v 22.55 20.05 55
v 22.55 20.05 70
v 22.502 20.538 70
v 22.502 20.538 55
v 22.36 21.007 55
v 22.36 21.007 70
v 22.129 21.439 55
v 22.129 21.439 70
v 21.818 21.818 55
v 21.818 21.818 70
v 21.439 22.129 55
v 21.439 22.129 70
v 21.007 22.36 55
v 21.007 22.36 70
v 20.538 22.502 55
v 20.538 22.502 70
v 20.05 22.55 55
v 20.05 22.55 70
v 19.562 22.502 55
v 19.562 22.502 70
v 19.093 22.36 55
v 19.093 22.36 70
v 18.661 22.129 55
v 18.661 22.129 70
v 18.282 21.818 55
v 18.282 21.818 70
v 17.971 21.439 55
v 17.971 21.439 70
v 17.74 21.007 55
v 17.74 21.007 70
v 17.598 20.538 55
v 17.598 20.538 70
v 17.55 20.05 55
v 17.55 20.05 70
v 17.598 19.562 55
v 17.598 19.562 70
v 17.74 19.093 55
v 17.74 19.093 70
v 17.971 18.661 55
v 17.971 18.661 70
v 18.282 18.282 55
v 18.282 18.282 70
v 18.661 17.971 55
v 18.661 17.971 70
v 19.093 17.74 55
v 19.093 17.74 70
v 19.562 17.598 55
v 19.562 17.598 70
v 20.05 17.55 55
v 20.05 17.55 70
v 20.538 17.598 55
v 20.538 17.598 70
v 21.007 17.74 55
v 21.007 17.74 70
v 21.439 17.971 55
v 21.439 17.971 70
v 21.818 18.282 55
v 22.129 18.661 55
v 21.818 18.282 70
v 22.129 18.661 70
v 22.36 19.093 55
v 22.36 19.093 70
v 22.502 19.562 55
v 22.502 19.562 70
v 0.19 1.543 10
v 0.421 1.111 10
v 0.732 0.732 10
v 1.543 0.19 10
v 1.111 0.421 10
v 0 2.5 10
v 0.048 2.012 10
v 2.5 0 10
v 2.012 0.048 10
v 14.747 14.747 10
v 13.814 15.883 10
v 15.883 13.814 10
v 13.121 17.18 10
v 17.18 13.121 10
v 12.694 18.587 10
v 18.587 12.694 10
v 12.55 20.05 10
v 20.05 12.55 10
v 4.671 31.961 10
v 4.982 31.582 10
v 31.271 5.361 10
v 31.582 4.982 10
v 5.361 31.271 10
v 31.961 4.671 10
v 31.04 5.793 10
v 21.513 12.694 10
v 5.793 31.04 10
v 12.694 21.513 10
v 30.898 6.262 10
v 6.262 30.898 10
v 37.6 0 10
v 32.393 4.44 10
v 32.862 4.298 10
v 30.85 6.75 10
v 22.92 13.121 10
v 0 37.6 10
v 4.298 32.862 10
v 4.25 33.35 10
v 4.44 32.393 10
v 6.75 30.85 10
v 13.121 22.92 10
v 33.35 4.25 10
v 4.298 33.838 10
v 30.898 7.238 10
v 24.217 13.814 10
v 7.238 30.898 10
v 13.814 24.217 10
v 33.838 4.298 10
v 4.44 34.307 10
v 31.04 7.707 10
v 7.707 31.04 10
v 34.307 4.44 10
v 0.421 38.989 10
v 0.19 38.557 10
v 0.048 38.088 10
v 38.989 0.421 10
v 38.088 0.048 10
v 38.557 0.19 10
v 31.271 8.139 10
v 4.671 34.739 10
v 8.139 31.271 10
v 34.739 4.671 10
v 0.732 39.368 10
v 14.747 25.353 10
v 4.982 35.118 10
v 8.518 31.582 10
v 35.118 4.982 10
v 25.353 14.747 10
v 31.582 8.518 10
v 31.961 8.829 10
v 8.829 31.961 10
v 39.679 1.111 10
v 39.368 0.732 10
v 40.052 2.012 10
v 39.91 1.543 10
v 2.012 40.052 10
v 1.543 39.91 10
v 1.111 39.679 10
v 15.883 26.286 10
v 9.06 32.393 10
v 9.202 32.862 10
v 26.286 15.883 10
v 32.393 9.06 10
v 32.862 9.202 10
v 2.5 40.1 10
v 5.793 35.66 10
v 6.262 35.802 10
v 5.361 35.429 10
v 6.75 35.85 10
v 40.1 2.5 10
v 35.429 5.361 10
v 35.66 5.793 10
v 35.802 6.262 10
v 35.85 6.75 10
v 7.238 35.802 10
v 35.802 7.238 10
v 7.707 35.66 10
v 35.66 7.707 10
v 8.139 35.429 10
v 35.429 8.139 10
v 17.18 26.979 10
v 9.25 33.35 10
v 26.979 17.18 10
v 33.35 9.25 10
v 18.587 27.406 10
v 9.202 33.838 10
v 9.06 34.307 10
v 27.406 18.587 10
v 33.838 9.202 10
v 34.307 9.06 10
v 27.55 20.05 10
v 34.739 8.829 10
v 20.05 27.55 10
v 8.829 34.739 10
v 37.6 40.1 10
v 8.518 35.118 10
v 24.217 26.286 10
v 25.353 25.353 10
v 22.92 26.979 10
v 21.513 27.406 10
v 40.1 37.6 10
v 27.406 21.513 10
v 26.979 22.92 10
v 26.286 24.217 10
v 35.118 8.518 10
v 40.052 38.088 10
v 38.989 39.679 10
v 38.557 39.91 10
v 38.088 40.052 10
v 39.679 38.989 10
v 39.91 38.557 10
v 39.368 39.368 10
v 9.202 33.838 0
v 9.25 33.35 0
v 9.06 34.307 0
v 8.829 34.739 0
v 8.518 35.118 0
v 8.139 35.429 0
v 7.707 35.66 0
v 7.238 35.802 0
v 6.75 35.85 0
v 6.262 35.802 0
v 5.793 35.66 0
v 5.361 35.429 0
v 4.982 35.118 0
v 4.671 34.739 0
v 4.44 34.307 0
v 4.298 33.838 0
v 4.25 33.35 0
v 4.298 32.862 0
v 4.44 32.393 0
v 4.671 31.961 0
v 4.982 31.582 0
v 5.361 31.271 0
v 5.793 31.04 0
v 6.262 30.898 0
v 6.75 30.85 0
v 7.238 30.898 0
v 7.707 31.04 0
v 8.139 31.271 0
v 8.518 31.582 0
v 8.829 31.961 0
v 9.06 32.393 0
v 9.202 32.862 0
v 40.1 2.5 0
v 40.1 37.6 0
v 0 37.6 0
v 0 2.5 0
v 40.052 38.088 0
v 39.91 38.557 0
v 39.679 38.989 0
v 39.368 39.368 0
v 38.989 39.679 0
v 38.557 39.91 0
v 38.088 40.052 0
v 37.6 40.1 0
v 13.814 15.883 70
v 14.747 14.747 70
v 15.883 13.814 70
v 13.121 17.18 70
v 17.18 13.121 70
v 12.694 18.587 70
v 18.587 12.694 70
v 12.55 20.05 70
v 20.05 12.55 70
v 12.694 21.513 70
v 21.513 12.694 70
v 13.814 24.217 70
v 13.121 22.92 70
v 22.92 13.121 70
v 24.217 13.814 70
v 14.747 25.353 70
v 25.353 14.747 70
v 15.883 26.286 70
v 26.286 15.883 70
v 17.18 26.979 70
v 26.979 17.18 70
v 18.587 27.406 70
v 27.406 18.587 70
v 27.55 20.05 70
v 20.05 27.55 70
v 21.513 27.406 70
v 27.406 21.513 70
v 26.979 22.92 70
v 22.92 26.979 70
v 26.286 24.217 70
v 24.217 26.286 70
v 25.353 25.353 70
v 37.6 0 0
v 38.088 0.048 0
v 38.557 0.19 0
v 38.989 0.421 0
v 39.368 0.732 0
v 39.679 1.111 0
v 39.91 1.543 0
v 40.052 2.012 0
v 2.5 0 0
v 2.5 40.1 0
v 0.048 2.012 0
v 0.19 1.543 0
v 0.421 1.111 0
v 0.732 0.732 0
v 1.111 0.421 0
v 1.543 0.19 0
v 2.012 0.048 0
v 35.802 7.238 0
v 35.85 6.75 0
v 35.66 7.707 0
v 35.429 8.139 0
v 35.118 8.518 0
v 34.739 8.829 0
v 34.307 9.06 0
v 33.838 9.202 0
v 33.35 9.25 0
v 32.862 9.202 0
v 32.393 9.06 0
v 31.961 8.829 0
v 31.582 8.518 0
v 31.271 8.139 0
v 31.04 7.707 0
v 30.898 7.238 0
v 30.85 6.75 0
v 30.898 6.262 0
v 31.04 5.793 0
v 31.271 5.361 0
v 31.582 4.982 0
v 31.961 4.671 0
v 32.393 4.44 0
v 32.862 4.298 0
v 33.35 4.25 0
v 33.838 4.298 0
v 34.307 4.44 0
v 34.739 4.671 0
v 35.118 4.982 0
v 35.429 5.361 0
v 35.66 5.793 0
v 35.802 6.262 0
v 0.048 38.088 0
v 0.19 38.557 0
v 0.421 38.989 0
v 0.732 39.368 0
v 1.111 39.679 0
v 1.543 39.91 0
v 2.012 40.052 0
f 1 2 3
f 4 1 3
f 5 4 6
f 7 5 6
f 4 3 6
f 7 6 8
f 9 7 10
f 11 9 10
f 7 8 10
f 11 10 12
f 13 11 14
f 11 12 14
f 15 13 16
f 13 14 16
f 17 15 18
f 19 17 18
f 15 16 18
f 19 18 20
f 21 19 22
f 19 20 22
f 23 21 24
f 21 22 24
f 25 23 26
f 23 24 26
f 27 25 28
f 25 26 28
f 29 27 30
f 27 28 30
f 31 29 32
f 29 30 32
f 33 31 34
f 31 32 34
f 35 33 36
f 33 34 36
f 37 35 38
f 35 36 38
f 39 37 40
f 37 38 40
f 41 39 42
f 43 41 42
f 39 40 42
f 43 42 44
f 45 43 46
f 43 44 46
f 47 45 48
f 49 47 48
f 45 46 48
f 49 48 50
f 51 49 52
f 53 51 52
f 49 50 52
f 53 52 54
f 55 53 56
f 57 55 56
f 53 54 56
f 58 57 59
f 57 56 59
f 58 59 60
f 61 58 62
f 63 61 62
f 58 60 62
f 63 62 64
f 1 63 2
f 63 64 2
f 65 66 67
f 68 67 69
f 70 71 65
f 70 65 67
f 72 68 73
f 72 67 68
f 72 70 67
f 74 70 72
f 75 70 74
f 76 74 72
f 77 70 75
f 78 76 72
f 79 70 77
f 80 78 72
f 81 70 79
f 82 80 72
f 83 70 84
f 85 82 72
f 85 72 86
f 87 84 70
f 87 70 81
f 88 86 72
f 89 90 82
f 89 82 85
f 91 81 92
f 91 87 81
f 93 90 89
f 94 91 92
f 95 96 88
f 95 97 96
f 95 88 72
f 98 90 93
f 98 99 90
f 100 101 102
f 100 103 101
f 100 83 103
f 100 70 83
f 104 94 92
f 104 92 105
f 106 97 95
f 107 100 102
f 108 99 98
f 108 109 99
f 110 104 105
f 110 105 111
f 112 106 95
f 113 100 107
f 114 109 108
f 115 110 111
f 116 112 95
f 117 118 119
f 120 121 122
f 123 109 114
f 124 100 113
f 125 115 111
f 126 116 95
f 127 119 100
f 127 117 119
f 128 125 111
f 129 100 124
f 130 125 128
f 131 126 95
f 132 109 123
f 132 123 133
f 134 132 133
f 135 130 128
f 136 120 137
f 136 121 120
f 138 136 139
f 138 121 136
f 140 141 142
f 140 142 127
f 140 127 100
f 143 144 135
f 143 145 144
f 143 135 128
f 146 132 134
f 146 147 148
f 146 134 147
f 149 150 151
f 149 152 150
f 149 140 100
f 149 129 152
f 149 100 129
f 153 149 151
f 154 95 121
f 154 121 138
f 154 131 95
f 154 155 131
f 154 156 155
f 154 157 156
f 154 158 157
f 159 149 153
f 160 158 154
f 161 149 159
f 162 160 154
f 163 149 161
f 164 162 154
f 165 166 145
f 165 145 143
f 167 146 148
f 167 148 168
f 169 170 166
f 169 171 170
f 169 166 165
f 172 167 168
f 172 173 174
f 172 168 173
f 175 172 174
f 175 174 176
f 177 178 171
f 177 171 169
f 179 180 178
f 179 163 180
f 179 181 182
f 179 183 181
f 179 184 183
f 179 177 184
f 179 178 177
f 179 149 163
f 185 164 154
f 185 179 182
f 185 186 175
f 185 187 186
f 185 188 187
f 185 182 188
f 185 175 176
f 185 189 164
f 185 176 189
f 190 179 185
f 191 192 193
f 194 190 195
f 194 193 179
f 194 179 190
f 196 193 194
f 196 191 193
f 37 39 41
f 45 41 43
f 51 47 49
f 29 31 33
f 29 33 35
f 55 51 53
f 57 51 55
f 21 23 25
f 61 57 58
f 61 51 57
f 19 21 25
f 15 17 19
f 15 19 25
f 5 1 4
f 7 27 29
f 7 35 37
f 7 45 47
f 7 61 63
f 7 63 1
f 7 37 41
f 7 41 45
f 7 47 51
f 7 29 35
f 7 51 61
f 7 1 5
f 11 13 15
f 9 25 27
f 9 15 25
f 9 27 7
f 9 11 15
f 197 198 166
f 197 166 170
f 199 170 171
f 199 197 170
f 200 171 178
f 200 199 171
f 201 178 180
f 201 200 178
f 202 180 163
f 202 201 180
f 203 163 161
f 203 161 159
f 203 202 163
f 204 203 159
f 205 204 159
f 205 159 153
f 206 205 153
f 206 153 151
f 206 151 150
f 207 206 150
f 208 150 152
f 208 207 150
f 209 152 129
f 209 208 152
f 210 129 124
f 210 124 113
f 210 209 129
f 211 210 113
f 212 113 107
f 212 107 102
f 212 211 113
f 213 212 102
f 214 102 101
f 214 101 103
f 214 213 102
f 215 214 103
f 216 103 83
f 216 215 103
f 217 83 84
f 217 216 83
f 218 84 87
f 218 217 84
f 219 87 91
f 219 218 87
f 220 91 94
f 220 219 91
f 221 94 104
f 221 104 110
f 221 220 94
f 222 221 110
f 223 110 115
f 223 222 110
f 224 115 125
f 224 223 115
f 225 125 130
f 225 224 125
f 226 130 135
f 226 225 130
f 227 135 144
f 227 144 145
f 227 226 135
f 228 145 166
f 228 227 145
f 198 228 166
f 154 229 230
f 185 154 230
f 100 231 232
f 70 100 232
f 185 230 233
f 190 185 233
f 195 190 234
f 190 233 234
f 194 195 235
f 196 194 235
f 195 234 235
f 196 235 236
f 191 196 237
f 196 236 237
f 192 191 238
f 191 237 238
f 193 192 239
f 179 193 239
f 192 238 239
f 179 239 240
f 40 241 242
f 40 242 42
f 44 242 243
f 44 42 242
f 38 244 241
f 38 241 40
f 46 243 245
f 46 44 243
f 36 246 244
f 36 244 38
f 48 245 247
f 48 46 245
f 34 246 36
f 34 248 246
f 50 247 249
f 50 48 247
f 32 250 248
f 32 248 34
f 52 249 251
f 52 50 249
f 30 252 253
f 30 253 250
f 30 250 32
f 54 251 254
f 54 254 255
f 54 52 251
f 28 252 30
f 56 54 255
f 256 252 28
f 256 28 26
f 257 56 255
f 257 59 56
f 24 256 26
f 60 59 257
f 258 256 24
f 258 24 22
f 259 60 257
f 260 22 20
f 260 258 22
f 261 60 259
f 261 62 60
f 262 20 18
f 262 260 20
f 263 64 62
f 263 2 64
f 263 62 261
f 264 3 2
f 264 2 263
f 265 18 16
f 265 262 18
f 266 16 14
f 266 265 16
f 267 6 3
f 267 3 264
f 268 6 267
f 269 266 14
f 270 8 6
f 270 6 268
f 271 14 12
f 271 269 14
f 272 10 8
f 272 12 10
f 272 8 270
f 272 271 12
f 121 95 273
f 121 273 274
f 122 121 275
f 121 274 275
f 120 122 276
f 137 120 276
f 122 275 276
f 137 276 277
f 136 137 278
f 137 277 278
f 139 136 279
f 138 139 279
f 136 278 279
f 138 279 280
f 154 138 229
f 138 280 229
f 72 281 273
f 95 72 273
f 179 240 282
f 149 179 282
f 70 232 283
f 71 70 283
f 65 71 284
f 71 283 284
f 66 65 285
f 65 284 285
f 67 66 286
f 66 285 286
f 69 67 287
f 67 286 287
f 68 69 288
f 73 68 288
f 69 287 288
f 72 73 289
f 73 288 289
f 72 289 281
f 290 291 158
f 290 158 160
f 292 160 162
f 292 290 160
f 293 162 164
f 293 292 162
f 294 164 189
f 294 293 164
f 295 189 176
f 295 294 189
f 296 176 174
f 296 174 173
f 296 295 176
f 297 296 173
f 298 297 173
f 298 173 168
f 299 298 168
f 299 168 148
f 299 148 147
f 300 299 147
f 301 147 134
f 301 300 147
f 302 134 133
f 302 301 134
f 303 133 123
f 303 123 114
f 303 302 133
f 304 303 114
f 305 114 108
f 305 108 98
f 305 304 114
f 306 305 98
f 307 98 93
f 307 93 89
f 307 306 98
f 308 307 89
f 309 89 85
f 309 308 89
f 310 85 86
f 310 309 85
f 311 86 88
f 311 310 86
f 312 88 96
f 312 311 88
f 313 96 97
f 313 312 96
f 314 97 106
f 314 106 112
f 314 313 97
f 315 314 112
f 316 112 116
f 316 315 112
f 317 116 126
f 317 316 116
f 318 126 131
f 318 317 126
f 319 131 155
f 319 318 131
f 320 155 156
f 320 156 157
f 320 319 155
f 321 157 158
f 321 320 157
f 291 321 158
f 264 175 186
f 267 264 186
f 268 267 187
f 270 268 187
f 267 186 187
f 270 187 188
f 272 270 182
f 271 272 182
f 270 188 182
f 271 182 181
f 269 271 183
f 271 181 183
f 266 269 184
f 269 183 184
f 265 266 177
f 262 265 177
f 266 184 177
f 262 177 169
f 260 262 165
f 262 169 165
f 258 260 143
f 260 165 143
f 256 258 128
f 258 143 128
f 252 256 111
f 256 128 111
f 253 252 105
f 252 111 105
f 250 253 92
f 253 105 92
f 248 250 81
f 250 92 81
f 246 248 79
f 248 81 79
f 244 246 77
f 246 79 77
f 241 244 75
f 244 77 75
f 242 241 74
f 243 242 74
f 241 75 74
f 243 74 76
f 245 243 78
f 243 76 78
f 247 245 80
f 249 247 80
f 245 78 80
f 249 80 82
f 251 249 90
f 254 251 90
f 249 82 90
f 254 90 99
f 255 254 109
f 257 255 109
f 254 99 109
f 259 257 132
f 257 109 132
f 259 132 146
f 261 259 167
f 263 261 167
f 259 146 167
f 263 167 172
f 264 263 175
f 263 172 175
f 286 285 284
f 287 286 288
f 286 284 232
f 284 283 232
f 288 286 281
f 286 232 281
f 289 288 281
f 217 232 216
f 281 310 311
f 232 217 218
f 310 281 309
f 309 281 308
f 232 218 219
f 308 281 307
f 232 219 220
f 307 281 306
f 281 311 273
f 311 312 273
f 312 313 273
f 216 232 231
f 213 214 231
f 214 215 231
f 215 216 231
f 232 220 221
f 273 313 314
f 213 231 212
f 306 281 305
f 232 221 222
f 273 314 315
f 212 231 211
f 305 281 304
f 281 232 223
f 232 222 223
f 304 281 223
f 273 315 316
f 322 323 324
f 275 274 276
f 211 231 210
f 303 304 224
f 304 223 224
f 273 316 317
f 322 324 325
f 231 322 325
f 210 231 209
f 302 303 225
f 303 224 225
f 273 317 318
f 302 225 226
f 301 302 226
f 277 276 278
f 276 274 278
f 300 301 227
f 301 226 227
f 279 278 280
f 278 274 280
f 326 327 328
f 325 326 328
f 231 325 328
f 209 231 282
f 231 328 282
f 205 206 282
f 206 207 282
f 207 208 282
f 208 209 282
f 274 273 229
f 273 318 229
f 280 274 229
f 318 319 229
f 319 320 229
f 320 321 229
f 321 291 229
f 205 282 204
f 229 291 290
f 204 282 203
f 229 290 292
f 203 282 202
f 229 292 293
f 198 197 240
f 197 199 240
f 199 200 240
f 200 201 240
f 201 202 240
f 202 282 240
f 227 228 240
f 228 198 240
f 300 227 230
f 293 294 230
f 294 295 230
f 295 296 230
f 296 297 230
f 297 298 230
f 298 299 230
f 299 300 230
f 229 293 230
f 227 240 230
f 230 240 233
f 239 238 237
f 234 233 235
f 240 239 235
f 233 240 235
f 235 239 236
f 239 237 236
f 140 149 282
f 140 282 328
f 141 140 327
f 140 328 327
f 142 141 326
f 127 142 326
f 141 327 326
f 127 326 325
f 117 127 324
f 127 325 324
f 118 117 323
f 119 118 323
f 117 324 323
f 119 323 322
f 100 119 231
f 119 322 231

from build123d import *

# Parameters (mm, degrees)
SKETCH1_R           = 2.5
BOSS_EXTRUDE1_DEPTH = 10
SKETCH2_R           = 7.5
BOSS_EXTRUDE2_DEPTH = 60
SKETCH3_R           = 2.5
CUT_EXTRUDE1_DEPTH  = 15


with BuildPart() as part:
    # Sketch1 → Boss-Extrude1 (new body)
    with BuildSketch(Plane.XY):
        with BuildLine():
            Line((2.5, 0), (37.6, 0))
            ThreePointArc((37.6, 0), (39.367766953, 0.732233047), (40.1, 2.5))
            Line((40.1, 2.5), (40.1, 37.6))
            ThreePointArc((40.1, 37.6), (39.367766953, 39.367766953), (37.6, 40.1))
            Line((37.6, 40.1), (2.5, 40.1))
            ThreePointArc((2.5, 40.1), (0.732233047, 39.367766953), (0, 37.6))
            Line((0, 37.6), (0, 2.5))
            ThreePointArc((0, 2.5), (0.732233047, 0.732233047), (2.5, 0))
        make_face()
        with Locations((6.75, 33.35)):
            Circle(SKETCH1_R, mode=Mode.SUBTRACT)
        with Locations((33.35, 6.75)):
            Circle(SKETCH1_R, mode=Mode.SUBTRACT)
    extrude(amount=BOSS_EXTRUDE1_DEPTH)

    # Sketch2 → Boss-Extrude2 (add)
    with BuildSketch(Plane.XY.offset(10)):
        with Locations((20.05, 20.05)):
            Circle(SKETCH2_R)
    extrude(amount=BOSS_EXTRUDE2_DEPTH)

    # Sketch3 → Cut-Extrude1 (cut)
    with BuildSketch(Plane.XY.offset(70)):
        with Locations((20.05, 20.05)):
            Circle(SKETCH3_R)
    extrude(amount=-CUT_EXTRUDE1_DEPTH, mode=Mode.SUBTRACT)


solid = part.part
